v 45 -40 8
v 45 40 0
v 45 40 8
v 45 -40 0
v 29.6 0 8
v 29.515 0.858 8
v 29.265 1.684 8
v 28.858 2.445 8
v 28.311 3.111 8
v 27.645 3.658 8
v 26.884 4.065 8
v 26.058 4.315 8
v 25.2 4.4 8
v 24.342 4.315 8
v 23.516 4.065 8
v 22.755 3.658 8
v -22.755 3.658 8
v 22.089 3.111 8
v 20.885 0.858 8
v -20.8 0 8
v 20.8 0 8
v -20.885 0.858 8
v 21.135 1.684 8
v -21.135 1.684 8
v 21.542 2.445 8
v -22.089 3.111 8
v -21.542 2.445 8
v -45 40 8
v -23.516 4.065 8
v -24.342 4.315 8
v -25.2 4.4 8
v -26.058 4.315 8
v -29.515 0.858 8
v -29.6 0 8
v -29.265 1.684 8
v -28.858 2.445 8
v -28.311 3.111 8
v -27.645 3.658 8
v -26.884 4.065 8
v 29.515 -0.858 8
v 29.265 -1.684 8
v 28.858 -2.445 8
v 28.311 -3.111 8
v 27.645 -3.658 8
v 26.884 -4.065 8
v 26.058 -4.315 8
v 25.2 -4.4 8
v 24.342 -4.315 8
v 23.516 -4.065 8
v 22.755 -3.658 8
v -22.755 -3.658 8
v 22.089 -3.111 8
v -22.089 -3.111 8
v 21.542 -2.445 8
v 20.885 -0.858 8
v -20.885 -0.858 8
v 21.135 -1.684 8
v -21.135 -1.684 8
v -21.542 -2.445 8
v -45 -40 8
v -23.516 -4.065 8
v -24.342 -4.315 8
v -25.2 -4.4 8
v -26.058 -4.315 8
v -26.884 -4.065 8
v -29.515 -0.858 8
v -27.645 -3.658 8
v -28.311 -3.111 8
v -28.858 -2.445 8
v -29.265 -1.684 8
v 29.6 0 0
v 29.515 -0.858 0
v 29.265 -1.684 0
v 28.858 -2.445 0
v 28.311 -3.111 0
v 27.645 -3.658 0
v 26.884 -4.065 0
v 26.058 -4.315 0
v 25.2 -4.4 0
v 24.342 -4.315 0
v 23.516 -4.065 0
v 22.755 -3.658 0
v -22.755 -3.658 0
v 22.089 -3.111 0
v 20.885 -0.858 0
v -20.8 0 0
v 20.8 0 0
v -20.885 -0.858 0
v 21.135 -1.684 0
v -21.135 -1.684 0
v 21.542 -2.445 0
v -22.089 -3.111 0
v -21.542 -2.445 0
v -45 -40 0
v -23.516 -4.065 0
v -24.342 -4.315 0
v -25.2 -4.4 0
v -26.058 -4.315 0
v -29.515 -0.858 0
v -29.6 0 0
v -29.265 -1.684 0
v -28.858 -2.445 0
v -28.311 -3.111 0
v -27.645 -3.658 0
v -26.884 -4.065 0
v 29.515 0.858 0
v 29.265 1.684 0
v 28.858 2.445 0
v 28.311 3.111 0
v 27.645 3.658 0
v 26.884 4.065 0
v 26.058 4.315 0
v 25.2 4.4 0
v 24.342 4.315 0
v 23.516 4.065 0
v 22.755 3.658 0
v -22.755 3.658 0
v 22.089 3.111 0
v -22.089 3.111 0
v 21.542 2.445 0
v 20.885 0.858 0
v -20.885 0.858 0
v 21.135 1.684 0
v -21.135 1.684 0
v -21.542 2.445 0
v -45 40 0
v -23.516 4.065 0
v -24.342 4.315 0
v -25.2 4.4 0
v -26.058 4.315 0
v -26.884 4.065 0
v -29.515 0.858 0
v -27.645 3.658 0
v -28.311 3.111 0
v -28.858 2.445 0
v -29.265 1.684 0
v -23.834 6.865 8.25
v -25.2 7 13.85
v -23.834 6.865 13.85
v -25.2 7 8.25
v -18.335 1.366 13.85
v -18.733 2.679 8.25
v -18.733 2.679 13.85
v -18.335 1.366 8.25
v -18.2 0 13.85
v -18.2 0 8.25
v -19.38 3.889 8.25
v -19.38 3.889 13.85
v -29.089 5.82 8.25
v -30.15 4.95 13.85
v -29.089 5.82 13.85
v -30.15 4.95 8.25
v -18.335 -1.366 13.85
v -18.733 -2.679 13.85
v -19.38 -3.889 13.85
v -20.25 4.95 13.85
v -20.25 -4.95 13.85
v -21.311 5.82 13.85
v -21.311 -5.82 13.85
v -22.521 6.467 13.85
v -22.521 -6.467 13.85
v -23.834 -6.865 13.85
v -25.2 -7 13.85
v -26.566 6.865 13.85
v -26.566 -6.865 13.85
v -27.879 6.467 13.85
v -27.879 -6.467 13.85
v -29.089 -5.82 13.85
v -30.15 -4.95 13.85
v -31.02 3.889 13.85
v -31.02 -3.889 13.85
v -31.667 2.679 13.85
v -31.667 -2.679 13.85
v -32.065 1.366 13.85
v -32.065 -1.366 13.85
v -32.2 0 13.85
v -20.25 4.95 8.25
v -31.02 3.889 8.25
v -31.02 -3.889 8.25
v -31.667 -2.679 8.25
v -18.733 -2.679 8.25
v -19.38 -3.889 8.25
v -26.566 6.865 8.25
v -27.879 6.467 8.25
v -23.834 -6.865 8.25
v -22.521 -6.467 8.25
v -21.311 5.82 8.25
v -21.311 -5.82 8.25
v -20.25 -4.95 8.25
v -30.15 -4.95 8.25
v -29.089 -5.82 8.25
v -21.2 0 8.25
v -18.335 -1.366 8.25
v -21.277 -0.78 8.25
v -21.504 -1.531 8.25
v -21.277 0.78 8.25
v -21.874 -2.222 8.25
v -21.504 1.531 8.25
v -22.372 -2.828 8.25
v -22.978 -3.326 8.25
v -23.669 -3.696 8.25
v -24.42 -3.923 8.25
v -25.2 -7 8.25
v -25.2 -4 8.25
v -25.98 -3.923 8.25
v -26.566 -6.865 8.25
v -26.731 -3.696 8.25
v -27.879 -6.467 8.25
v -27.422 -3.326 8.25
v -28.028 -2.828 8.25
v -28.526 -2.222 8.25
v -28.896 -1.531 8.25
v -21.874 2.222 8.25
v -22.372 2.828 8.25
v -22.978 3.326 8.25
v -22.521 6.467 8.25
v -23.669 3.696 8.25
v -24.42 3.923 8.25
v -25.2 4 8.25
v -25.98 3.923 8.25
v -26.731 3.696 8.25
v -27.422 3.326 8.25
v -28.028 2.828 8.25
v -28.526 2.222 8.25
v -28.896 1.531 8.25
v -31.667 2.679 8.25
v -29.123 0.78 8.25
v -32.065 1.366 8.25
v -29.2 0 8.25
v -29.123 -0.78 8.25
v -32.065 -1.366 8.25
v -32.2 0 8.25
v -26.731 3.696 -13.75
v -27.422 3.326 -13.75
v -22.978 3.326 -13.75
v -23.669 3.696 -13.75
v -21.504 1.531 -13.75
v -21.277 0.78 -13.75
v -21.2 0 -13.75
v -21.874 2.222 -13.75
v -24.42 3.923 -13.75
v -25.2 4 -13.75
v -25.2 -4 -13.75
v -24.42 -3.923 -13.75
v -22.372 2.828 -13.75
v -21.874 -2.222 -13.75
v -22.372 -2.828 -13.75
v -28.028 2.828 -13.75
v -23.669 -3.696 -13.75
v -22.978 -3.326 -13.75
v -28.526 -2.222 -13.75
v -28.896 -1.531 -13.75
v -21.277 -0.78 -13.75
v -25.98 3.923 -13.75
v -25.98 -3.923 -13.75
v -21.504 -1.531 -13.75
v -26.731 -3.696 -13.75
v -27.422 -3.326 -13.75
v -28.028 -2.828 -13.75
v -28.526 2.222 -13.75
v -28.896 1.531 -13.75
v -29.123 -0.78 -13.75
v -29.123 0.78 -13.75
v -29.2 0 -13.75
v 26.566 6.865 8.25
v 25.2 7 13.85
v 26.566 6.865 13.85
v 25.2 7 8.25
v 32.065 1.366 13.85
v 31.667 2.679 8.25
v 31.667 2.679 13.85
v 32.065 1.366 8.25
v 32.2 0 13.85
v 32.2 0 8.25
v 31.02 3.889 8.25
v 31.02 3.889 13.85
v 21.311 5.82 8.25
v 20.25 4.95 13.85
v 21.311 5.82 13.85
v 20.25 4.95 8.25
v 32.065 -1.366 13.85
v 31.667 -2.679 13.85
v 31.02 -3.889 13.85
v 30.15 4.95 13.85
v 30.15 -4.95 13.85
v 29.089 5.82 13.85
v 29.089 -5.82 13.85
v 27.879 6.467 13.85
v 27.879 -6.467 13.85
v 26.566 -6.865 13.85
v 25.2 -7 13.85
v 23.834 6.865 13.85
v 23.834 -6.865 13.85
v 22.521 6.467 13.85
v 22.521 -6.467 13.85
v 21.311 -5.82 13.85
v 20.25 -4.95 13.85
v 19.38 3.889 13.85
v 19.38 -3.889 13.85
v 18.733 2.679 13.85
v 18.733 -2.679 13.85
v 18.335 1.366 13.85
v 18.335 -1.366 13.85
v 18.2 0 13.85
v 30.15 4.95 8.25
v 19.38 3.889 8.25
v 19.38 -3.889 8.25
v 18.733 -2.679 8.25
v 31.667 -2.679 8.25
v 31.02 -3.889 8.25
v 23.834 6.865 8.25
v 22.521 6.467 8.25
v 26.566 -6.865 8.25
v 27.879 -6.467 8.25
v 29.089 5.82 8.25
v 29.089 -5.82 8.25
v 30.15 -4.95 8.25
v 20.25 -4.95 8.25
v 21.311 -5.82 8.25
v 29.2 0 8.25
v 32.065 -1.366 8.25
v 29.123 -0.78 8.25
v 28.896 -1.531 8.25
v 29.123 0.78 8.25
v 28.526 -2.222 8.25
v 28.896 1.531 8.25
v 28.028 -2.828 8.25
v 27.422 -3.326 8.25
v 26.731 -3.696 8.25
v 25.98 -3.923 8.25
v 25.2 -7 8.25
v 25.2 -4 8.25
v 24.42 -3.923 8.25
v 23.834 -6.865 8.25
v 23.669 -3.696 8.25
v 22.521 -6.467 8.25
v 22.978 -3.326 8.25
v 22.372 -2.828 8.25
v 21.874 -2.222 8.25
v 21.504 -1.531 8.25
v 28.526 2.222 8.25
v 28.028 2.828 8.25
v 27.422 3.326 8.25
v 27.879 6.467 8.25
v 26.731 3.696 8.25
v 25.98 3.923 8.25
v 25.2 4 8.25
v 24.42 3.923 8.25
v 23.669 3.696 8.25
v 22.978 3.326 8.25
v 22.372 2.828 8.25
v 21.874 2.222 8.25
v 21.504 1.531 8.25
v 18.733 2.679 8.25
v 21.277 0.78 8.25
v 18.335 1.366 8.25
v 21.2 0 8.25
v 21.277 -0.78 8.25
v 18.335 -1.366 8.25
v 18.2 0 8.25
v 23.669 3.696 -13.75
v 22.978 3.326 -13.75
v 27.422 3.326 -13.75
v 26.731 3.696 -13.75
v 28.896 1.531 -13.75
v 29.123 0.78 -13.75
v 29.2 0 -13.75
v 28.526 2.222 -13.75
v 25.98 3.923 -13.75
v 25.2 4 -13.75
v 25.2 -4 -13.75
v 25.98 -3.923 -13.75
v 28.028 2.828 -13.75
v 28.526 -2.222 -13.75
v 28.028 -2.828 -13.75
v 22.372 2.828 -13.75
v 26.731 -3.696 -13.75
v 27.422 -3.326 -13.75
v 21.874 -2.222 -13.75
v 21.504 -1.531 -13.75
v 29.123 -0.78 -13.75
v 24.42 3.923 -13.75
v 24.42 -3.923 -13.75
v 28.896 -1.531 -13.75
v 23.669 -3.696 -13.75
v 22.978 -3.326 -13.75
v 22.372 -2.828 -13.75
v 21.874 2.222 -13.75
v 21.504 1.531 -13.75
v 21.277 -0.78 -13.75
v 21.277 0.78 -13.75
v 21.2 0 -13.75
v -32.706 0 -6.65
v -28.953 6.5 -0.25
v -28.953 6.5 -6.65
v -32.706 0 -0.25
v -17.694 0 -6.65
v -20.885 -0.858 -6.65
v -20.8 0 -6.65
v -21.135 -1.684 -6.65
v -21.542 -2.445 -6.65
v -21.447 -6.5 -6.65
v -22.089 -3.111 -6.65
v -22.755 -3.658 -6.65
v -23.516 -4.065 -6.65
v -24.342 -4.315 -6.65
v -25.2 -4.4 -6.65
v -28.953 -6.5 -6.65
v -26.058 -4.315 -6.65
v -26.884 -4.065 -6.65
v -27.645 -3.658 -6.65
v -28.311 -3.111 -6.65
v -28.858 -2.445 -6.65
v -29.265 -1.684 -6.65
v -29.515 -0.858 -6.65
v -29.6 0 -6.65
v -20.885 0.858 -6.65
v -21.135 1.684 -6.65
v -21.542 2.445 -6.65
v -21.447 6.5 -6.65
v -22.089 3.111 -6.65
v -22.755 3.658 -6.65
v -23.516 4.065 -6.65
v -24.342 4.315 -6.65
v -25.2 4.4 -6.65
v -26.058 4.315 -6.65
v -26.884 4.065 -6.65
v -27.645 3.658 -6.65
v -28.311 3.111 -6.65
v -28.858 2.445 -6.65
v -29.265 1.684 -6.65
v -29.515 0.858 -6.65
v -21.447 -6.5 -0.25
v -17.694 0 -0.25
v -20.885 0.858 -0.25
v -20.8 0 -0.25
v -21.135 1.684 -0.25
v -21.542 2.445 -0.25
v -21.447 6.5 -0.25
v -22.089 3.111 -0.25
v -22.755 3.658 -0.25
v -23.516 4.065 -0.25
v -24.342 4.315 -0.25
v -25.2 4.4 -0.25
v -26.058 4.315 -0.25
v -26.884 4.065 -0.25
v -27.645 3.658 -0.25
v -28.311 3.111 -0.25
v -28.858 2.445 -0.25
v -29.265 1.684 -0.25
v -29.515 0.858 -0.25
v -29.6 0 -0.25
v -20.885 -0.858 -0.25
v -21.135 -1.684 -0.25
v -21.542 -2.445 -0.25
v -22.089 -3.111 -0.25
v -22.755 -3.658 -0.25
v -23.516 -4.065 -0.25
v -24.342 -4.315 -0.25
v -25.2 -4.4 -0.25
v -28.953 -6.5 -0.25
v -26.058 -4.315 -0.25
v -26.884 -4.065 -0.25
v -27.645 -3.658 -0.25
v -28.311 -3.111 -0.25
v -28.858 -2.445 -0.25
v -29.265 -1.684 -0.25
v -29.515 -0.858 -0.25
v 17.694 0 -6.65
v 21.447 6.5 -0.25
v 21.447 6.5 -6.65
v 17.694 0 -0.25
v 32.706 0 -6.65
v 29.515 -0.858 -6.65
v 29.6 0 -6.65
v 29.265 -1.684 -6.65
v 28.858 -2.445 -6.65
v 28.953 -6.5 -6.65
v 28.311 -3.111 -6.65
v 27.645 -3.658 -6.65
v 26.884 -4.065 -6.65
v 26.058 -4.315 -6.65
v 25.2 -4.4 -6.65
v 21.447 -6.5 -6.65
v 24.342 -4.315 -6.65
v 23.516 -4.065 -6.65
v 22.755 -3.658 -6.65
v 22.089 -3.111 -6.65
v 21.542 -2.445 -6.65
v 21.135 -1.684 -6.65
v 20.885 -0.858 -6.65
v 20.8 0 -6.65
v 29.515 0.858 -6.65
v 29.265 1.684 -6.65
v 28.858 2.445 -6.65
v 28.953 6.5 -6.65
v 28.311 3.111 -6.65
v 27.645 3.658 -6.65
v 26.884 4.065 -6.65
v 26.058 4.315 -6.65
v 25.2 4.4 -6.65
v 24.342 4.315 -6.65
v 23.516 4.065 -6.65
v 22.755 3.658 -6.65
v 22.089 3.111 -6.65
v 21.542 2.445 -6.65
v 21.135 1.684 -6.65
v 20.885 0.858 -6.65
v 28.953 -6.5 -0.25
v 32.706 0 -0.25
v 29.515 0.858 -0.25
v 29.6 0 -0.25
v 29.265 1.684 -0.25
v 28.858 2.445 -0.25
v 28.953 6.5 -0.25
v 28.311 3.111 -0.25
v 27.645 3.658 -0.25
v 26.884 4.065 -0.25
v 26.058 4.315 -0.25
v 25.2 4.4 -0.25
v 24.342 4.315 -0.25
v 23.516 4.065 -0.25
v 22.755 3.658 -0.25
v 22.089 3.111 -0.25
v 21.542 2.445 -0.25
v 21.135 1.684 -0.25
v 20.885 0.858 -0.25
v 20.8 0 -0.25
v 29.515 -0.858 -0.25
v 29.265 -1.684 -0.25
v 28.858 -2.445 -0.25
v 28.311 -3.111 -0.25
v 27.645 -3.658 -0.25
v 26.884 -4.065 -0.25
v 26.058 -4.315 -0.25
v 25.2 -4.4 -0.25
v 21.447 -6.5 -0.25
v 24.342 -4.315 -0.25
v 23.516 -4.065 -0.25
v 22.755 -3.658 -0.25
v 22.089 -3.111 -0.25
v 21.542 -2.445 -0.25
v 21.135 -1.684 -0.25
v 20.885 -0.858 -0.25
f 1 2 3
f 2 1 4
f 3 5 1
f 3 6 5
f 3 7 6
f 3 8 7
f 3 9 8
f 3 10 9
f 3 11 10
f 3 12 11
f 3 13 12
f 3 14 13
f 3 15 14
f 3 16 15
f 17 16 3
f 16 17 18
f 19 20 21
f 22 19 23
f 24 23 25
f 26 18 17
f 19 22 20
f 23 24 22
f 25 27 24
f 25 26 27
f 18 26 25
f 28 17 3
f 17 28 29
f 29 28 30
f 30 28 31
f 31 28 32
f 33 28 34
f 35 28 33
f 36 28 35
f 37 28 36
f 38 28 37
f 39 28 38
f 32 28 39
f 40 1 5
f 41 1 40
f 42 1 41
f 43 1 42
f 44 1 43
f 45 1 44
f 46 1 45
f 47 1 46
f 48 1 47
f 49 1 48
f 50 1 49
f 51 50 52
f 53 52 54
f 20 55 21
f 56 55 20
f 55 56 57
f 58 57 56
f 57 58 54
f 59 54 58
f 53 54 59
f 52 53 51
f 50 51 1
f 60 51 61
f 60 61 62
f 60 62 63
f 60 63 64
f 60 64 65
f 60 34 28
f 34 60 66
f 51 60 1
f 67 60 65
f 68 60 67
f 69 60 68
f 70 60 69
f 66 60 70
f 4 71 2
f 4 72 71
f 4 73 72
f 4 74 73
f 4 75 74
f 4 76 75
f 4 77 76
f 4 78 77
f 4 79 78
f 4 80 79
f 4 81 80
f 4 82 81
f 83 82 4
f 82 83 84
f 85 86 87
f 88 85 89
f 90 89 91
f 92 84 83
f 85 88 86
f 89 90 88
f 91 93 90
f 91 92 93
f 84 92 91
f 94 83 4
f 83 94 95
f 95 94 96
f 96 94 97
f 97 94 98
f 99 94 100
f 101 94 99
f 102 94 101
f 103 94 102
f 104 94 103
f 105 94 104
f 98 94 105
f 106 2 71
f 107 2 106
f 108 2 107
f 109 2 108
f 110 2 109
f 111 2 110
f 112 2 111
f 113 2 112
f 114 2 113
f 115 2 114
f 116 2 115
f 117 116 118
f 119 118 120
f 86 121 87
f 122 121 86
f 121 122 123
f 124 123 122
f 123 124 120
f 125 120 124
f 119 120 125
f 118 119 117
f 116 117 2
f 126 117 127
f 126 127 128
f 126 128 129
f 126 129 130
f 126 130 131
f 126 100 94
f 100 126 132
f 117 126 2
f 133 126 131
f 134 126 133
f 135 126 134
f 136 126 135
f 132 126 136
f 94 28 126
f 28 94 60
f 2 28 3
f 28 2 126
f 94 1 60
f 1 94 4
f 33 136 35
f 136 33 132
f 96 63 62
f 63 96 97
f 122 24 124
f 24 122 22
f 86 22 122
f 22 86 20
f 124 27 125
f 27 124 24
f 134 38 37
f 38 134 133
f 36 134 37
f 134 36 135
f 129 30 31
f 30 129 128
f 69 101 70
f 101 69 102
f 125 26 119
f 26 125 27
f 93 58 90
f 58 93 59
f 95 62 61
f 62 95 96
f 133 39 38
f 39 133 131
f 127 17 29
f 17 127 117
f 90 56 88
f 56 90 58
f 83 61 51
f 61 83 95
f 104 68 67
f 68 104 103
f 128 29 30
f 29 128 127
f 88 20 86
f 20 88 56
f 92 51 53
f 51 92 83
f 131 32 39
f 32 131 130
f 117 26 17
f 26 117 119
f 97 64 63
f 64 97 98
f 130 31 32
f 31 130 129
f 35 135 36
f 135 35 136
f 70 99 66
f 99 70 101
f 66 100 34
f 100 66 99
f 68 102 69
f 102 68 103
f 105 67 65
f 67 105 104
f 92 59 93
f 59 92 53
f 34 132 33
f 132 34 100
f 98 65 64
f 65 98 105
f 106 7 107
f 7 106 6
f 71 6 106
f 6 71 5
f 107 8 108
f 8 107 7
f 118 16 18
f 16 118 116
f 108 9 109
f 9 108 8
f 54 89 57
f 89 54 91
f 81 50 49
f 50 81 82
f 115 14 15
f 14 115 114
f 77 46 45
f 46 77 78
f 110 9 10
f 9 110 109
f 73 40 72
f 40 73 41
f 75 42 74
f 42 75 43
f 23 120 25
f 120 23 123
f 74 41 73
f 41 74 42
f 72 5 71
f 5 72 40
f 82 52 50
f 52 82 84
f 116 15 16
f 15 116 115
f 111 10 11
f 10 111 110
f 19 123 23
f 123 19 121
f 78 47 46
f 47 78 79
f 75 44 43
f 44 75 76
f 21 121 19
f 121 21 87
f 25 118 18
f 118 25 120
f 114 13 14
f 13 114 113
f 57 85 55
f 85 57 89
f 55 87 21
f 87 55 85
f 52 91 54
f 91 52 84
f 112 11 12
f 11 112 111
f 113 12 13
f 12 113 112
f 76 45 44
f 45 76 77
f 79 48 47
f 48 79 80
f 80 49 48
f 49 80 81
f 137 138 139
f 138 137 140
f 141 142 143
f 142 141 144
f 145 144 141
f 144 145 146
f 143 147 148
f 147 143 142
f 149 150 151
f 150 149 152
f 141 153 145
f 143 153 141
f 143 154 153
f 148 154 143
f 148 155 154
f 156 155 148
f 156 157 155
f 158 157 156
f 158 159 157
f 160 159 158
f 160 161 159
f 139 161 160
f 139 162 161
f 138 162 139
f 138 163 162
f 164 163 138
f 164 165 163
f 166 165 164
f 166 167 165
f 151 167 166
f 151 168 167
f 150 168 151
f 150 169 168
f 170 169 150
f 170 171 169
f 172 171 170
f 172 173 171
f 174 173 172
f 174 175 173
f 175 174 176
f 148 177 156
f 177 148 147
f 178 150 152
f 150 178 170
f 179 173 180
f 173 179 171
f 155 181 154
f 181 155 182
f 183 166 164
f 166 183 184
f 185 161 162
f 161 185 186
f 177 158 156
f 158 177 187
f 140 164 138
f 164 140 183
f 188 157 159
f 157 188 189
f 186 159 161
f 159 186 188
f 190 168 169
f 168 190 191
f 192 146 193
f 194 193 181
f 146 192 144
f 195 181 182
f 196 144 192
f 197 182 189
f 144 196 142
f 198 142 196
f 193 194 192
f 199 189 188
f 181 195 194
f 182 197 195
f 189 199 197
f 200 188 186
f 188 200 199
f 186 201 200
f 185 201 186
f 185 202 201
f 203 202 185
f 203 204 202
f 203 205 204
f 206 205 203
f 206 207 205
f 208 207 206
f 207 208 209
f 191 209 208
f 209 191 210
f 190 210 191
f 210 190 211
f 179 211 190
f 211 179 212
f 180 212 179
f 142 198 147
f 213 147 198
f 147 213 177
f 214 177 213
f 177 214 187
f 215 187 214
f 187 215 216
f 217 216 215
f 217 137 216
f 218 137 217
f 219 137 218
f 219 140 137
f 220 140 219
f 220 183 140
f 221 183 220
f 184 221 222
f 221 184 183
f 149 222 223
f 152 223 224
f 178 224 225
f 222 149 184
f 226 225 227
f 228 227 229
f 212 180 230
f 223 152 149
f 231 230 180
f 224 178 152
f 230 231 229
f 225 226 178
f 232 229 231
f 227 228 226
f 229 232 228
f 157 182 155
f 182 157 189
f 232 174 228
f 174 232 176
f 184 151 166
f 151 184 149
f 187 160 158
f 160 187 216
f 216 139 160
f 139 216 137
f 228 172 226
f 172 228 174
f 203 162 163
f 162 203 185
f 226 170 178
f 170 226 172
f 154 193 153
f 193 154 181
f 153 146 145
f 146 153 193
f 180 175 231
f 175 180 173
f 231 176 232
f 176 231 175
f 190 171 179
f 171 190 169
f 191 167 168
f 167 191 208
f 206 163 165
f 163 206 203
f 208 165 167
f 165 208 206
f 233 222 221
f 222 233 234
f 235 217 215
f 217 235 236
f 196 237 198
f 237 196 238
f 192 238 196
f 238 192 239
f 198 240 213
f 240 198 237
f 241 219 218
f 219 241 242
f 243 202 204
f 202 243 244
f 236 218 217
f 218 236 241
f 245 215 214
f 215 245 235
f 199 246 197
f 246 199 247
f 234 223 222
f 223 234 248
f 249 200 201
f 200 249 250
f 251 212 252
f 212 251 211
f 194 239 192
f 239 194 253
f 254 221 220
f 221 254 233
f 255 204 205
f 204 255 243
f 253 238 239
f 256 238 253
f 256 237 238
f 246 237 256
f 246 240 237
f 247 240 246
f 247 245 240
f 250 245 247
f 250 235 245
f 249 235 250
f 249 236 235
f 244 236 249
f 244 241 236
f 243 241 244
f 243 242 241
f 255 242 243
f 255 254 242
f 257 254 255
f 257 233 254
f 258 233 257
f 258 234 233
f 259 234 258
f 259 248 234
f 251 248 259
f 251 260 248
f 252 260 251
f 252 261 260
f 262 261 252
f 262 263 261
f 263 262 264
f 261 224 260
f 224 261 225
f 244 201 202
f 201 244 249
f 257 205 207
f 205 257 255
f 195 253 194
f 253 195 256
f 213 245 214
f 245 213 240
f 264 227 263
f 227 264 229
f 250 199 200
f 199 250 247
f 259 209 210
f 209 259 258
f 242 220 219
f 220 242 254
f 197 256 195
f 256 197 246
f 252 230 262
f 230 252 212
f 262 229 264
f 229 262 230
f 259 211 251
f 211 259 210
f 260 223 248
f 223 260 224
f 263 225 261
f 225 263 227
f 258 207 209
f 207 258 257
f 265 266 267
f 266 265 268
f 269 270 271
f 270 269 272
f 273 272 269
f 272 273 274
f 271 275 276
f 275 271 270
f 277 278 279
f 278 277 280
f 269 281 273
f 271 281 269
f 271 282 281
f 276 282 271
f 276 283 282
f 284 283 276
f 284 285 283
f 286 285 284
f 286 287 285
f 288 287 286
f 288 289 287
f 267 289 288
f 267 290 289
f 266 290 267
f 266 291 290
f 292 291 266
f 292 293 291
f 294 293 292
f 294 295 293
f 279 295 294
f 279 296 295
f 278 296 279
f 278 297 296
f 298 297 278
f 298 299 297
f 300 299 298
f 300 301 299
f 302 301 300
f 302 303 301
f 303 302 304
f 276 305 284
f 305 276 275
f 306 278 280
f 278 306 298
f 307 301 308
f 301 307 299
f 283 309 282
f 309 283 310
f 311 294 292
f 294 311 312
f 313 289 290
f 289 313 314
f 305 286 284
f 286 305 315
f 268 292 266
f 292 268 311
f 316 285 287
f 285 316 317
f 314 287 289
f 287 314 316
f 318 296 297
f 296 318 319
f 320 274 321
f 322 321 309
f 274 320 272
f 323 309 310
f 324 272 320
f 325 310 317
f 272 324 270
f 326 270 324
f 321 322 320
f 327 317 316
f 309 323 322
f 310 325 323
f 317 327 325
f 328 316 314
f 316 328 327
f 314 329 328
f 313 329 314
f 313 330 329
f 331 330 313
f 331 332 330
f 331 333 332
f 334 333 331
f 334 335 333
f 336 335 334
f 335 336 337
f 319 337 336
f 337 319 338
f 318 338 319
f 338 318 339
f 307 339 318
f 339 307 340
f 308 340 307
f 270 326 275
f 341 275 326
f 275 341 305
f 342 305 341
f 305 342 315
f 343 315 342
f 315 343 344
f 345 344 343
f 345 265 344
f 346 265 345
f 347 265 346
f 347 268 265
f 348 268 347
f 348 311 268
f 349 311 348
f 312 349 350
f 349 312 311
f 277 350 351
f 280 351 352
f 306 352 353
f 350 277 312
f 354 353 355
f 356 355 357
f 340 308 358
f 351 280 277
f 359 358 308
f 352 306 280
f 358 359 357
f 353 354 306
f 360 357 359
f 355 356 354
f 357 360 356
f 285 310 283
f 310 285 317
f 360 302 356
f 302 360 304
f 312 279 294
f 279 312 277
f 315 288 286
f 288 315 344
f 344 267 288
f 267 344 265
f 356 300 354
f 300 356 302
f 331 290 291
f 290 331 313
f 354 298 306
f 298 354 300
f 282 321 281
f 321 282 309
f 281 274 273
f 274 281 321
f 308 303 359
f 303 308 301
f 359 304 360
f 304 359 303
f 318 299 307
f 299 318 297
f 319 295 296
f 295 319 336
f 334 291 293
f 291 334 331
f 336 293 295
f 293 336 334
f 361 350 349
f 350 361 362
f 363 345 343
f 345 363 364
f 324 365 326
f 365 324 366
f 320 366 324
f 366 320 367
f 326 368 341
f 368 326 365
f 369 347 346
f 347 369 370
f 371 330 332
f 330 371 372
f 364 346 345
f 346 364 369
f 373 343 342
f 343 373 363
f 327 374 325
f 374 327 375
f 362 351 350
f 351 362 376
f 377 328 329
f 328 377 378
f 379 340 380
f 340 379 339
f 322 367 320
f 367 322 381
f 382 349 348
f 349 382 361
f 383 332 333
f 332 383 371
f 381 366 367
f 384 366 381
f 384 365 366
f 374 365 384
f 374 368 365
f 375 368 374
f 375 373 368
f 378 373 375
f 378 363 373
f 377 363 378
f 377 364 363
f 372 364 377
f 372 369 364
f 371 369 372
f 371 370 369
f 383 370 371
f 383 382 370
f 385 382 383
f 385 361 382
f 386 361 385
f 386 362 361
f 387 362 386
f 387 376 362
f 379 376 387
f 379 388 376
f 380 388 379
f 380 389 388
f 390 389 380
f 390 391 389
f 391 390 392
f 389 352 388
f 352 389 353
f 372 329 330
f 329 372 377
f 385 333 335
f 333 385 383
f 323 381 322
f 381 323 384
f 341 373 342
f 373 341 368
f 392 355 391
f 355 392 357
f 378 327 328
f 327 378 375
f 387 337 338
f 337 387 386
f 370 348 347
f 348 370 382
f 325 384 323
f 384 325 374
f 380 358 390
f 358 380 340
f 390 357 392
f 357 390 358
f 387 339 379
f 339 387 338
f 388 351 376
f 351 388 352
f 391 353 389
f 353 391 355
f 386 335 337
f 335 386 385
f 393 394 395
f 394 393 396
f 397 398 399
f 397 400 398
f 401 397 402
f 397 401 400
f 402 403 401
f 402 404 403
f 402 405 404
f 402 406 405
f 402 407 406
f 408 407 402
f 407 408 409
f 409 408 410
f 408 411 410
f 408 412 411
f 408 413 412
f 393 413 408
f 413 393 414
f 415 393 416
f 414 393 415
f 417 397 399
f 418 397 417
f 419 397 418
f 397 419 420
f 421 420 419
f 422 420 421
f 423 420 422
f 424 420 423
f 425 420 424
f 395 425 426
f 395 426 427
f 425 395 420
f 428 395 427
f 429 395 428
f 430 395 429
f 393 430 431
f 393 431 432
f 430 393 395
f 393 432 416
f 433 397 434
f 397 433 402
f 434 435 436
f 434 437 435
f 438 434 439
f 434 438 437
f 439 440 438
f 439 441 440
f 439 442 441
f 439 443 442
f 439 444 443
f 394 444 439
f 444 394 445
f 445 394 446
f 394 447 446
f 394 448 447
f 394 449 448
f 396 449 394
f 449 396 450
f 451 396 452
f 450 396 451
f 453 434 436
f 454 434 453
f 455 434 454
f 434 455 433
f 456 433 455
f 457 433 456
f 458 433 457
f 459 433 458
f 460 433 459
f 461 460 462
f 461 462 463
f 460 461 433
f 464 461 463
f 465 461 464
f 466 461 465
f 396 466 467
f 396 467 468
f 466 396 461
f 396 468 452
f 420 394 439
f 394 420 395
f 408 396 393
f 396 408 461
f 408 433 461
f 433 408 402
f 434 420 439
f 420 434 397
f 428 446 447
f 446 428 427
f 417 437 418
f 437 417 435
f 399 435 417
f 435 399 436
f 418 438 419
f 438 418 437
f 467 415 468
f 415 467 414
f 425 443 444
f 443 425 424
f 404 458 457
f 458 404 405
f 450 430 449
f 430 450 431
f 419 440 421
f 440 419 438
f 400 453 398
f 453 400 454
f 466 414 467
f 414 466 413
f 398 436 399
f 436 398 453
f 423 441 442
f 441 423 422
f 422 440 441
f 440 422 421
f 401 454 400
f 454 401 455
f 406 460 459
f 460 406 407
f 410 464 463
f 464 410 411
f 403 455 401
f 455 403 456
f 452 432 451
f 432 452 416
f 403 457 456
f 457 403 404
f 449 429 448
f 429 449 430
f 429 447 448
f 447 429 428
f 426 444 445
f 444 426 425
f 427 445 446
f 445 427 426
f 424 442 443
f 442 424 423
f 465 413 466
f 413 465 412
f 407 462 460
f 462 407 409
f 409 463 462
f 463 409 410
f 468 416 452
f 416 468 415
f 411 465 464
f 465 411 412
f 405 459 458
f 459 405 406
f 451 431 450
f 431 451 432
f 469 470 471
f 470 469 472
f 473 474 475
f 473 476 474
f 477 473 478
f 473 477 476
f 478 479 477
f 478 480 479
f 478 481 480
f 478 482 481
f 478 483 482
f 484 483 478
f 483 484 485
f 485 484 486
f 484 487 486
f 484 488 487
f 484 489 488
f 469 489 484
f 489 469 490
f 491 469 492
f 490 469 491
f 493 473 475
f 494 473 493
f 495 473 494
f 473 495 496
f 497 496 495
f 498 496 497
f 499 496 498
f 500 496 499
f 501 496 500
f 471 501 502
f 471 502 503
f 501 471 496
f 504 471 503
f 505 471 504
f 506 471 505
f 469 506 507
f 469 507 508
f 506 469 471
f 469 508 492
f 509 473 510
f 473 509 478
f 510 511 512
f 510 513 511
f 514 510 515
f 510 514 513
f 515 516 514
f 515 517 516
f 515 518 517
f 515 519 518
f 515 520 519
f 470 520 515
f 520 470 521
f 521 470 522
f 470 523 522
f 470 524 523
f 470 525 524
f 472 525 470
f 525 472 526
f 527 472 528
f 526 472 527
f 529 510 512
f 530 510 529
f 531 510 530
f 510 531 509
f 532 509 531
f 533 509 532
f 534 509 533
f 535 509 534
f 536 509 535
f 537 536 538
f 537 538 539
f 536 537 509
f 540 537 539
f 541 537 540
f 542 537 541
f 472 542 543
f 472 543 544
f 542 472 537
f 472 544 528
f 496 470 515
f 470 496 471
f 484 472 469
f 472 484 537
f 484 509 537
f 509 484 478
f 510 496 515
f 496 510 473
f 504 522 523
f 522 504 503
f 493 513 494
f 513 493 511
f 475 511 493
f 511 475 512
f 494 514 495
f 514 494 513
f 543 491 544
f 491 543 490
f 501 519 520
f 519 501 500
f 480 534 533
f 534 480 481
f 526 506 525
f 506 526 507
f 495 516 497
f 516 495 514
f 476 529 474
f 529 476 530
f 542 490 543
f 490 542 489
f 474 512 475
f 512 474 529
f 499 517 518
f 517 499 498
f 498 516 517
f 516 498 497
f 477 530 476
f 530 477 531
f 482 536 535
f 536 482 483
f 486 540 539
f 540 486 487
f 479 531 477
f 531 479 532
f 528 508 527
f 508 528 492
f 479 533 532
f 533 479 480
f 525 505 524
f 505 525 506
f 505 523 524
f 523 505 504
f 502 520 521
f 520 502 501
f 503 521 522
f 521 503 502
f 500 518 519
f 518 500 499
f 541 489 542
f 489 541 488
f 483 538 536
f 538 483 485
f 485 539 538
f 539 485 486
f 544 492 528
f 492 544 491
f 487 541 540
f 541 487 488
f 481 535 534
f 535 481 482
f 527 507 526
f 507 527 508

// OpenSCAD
$fn = 32;

// ------------------------------------------------------------------------
// Bolted plate: 90 x 80 x 8 mm plate, 2 fasteners
// Every part is its own module, assembly() places them once.
// ------------------------------------------------------------------------

// --- part 1 ---
module plate() {
  difference() {
    translate([-45, -40, 0]) cube([90, 80, 8]);
    translate([-25.2, 0, -1]) cylinder(h = 10, d = 8.8);
    translate([25.2, 0, -1]) cylinder(h = 10, d = 8.8);
  }
}

// --- part 2 ---
module bolt1() {
  cylinder(h = 5.6, d = 14);
  translate([0, 0, -22]) cylinder(h = 22, d = 8);
}

// --- part 3 ---
module bolt2() {
  cylinder(h = 5.6, d = 14);
  translate([0, 0, -22]) cylinder(h = 22, d = 8);
}

// --- part 4 ---
module nut1() {
  difference() {
    linear_extrude(height = 6.4) polygon(points = [[7.506, 0], [3.753, 6.5], [-3.753, 6.5], [-7.506, 0], [-3.753, -6.5], [3.753, -6.5]]);
    translate([0, 0, -1]) cylinder(h = 8.4, d = 8.8);
  }
}

// --- part 5 ---
module nut2() {
  difference() {
    linear_extrude(height = 6.4) polygon(points = [[7.506, 0], [3.753, 6.5], [-3.753, 6.5], [-7.506, 0], [-3.753, -6.5], [3.753, -6.5]]);
    translate([0, 0, -1]) cylinder(h = 8.4, d = 8.8);
  }
}

// --- assembly ---
module assembly() {
  translate([0, 0, 0]) rotate([0, 0, 0]) plate();
  translate([-25.2, 0, 8.25]) rotate([0, 0, 0]) bolt1();
  translate([25.2, 0, 8.25]) rotate([0, 0, 0]) bolt2();
  translate([-25.2, 0, -6.65]) rotate([0, 0, 0]) nut1();
  translate([25.2, 0, -6.65]) rotate([0, 0, 0]) nut2();
}

assembly();
